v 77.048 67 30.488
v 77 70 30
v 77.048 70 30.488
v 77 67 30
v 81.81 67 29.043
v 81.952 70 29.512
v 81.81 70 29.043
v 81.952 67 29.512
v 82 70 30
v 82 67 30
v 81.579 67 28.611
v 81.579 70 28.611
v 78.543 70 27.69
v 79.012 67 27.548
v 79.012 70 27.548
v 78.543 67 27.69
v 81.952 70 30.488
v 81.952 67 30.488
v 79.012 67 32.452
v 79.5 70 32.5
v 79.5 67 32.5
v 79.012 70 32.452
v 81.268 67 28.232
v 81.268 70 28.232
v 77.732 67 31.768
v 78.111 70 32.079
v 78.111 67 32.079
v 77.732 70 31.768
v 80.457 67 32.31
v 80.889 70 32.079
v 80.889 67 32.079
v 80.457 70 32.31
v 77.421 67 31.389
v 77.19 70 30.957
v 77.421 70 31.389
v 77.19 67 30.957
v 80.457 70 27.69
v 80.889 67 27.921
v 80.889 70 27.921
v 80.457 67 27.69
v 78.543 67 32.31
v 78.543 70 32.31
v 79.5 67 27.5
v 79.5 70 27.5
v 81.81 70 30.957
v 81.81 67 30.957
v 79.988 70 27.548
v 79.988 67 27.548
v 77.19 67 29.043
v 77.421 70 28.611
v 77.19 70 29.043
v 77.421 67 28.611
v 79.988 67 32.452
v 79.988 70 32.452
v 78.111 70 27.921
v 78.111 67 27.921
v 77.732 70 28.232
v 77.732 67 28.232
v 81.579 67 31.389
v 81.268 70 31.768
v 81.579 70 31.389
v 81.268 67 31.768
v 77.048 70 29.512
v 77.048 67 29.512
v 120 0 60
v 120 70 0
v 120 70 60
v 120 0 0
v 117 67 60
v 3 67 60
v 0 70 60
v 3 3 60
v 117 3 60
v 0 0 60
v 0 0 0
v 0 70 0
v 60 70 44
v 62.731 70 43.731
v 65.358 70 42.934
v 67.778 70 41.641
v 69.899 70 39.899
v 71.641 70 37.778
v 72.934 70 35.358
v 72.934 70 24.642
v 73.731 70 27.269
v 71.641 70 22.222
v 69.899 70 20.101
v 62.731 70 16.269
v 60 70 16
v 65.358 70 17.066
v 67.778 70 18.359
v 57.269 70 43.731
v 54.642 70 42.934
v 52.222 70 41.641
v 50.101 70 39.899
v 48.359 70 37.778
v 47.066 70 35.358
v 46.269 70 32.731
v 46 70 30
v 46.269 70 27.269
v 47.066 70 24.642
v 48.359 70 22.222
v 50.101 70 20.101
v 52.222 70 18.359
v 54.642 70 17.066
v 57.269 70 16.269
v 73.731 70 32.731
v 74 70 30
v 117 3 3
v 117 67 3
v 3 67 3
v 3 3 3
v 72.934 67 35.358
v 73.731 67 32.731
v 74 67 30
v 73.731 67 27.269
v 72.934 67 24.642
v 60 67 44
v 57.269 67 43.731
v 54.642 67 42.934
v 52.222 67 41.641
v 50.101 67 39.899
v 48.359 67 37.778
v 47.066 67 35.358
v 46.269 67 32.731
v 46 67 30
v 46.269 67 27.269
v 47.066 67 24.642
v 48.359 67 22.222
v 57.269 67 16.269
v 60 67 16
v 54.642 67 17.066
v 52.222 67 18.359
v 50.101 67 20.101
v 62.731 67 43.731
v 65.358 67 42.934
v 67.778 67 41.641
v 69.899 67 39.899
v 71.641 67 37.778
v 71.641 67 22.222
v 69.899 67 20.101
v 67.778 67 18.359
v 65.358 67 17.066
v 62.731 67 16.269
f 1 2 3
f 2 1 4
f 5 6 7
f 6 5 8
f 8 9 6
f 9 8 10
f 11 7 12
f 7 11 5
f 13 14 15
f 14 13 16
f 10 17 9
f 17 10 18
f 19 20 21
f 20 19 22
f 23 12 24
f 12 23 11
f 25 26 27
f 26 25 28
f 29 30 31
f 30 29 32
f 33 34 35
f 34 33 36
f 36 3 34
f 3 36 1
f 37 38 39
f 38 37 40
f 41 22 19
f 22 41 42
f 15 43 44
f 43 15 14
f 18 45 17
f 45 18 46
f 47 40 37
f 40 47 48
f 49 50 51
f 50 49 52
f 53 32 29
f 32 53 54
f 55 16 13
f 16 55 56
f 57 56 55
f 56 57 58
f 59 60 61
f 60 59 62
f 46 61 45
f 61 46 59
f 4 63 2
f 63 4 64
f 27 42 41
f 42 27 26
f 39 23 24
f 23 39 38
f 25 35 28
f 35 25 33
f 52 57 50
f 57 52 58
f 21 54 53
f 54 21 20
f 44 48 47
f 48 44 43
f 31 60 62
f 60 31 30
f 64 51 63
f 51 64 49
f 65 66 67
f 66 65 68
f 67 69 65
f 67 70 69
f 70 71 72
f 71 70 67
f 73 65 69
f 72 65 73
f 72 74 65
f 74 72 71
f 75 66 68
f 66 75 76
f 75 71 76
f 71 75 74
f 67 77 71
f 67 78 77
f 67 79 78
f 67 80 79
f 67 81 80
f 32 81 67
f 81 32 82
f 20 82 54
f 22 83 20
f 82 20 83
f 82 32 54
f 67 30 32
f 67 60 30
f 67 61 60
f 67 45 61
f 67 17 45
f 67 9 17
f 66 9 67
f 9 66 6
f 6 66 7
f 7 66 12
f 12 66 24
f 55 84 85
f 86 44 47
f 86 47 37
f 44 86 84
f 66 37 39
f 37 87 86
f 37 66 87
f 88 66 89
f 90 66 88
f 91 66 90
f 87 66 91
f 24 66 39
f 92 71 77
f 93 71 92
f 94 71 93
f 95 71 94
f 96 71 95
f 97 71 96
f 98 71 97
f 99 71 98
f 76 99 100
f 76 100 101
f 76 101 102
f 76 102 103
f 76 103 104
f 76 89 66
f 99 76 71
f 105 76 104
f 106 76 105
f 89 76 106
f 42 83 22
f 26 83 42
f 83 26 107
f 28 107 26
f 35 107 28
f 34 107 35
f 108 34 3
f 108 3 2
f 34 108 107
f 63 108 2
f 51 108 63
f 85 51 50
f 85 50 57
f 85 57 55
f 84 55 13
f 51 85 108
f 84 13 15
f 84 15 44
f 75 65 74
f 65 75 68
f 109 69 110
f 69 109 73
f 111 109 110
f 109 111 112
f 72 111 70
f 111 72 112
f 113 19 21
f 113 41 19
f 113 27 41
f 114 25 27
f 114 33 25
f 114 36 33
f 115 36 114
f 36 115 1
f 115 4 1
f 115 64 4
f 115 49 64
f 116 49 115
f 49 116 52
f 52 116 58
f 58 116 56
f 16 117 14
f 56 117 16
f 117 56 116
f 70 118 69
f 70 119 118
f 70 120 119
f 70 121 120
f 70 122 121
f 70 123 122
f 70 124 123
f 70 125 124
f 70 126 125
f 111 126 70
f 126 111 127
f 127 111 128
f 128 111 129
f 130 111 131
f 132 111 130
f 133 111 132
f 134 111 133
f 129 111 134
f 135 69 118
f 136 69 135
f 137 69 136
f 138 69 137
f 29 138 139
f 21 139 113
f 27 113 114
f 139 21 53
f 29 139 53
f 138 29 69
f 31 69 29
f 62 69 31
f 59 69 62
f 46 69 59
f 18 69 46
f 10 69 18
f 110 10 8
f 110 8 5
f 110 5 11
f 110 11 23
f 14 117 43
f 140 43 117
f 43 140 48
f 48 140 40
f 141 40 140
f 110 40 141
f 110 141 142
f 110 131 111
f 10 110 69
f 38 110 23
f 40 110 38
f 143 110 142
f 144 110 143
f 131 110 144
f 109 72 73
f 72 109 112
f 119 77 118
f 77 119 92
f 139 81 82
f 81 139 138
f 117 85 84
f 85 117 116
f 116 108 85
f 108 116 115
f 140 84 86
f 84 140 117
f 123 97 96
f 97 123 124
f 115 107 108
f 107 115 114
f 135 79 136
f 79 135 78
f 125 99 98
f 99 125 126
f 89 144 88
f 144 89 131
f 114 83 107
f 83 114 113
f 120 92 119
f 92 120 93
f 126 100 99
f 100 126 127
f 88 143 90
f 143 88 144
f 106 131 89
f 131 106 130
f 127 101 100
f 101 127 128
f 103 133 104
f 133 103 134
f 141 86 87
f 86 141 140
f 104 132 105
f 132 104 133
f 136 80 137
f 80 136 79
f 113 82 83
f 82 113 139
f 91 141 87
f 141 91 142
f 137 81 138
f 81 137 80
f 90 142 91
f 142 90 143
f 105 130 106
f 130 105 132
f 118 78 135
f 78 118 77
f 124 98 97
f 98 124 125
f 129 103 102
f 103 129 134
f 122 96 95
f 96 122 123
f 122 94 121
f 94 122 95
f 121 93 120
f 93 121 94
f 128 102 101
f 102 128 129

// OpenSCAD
$fn = 32;

// ----------------------------------------------------------------------
// Vent box: roundvent enclosure
// ----------------------------------------------------------------------

// --- parameters (mm) ---
box_l = 120;              // box length, X
box_w = 70;               // box width, Y
box_h = 60;               // box height, Z
wall_t = 3;               // shell wall thickness
vent_d = 28;              // central vent diameter
ring_d = 5;               // ring hole diameter
n_ring = 8;               // holes in the ring
ring_r = 19.5;            // ring radius

ring_step = 360 / n_ring;  // ring hole angular step

difference() {
  cube([box_l, box_w, box_h]);
  translate([wall_t, wall_t, wall_t])
    cube([box_l - 2 * wall_t, box_w - 2 * wall_t, box_h]);
  translate([box_l / 2, box_w - wall_t - 1, box_h / 2])
    rotate([-90, 0, 0]) cylinder(h = wall_t + 2, d = vent_d);
  for (i = [0 : n_ring - 1])
    translate([box_l / 2, box_w - wall_t - 1, box_h / 2])
      rotate([0, 0, i * ring_step])
        translate([ring_r, 0, 0]) rotate([-90, 0, 0])
          cylinder(h = wall_t + 2, d = ring_d);
}
